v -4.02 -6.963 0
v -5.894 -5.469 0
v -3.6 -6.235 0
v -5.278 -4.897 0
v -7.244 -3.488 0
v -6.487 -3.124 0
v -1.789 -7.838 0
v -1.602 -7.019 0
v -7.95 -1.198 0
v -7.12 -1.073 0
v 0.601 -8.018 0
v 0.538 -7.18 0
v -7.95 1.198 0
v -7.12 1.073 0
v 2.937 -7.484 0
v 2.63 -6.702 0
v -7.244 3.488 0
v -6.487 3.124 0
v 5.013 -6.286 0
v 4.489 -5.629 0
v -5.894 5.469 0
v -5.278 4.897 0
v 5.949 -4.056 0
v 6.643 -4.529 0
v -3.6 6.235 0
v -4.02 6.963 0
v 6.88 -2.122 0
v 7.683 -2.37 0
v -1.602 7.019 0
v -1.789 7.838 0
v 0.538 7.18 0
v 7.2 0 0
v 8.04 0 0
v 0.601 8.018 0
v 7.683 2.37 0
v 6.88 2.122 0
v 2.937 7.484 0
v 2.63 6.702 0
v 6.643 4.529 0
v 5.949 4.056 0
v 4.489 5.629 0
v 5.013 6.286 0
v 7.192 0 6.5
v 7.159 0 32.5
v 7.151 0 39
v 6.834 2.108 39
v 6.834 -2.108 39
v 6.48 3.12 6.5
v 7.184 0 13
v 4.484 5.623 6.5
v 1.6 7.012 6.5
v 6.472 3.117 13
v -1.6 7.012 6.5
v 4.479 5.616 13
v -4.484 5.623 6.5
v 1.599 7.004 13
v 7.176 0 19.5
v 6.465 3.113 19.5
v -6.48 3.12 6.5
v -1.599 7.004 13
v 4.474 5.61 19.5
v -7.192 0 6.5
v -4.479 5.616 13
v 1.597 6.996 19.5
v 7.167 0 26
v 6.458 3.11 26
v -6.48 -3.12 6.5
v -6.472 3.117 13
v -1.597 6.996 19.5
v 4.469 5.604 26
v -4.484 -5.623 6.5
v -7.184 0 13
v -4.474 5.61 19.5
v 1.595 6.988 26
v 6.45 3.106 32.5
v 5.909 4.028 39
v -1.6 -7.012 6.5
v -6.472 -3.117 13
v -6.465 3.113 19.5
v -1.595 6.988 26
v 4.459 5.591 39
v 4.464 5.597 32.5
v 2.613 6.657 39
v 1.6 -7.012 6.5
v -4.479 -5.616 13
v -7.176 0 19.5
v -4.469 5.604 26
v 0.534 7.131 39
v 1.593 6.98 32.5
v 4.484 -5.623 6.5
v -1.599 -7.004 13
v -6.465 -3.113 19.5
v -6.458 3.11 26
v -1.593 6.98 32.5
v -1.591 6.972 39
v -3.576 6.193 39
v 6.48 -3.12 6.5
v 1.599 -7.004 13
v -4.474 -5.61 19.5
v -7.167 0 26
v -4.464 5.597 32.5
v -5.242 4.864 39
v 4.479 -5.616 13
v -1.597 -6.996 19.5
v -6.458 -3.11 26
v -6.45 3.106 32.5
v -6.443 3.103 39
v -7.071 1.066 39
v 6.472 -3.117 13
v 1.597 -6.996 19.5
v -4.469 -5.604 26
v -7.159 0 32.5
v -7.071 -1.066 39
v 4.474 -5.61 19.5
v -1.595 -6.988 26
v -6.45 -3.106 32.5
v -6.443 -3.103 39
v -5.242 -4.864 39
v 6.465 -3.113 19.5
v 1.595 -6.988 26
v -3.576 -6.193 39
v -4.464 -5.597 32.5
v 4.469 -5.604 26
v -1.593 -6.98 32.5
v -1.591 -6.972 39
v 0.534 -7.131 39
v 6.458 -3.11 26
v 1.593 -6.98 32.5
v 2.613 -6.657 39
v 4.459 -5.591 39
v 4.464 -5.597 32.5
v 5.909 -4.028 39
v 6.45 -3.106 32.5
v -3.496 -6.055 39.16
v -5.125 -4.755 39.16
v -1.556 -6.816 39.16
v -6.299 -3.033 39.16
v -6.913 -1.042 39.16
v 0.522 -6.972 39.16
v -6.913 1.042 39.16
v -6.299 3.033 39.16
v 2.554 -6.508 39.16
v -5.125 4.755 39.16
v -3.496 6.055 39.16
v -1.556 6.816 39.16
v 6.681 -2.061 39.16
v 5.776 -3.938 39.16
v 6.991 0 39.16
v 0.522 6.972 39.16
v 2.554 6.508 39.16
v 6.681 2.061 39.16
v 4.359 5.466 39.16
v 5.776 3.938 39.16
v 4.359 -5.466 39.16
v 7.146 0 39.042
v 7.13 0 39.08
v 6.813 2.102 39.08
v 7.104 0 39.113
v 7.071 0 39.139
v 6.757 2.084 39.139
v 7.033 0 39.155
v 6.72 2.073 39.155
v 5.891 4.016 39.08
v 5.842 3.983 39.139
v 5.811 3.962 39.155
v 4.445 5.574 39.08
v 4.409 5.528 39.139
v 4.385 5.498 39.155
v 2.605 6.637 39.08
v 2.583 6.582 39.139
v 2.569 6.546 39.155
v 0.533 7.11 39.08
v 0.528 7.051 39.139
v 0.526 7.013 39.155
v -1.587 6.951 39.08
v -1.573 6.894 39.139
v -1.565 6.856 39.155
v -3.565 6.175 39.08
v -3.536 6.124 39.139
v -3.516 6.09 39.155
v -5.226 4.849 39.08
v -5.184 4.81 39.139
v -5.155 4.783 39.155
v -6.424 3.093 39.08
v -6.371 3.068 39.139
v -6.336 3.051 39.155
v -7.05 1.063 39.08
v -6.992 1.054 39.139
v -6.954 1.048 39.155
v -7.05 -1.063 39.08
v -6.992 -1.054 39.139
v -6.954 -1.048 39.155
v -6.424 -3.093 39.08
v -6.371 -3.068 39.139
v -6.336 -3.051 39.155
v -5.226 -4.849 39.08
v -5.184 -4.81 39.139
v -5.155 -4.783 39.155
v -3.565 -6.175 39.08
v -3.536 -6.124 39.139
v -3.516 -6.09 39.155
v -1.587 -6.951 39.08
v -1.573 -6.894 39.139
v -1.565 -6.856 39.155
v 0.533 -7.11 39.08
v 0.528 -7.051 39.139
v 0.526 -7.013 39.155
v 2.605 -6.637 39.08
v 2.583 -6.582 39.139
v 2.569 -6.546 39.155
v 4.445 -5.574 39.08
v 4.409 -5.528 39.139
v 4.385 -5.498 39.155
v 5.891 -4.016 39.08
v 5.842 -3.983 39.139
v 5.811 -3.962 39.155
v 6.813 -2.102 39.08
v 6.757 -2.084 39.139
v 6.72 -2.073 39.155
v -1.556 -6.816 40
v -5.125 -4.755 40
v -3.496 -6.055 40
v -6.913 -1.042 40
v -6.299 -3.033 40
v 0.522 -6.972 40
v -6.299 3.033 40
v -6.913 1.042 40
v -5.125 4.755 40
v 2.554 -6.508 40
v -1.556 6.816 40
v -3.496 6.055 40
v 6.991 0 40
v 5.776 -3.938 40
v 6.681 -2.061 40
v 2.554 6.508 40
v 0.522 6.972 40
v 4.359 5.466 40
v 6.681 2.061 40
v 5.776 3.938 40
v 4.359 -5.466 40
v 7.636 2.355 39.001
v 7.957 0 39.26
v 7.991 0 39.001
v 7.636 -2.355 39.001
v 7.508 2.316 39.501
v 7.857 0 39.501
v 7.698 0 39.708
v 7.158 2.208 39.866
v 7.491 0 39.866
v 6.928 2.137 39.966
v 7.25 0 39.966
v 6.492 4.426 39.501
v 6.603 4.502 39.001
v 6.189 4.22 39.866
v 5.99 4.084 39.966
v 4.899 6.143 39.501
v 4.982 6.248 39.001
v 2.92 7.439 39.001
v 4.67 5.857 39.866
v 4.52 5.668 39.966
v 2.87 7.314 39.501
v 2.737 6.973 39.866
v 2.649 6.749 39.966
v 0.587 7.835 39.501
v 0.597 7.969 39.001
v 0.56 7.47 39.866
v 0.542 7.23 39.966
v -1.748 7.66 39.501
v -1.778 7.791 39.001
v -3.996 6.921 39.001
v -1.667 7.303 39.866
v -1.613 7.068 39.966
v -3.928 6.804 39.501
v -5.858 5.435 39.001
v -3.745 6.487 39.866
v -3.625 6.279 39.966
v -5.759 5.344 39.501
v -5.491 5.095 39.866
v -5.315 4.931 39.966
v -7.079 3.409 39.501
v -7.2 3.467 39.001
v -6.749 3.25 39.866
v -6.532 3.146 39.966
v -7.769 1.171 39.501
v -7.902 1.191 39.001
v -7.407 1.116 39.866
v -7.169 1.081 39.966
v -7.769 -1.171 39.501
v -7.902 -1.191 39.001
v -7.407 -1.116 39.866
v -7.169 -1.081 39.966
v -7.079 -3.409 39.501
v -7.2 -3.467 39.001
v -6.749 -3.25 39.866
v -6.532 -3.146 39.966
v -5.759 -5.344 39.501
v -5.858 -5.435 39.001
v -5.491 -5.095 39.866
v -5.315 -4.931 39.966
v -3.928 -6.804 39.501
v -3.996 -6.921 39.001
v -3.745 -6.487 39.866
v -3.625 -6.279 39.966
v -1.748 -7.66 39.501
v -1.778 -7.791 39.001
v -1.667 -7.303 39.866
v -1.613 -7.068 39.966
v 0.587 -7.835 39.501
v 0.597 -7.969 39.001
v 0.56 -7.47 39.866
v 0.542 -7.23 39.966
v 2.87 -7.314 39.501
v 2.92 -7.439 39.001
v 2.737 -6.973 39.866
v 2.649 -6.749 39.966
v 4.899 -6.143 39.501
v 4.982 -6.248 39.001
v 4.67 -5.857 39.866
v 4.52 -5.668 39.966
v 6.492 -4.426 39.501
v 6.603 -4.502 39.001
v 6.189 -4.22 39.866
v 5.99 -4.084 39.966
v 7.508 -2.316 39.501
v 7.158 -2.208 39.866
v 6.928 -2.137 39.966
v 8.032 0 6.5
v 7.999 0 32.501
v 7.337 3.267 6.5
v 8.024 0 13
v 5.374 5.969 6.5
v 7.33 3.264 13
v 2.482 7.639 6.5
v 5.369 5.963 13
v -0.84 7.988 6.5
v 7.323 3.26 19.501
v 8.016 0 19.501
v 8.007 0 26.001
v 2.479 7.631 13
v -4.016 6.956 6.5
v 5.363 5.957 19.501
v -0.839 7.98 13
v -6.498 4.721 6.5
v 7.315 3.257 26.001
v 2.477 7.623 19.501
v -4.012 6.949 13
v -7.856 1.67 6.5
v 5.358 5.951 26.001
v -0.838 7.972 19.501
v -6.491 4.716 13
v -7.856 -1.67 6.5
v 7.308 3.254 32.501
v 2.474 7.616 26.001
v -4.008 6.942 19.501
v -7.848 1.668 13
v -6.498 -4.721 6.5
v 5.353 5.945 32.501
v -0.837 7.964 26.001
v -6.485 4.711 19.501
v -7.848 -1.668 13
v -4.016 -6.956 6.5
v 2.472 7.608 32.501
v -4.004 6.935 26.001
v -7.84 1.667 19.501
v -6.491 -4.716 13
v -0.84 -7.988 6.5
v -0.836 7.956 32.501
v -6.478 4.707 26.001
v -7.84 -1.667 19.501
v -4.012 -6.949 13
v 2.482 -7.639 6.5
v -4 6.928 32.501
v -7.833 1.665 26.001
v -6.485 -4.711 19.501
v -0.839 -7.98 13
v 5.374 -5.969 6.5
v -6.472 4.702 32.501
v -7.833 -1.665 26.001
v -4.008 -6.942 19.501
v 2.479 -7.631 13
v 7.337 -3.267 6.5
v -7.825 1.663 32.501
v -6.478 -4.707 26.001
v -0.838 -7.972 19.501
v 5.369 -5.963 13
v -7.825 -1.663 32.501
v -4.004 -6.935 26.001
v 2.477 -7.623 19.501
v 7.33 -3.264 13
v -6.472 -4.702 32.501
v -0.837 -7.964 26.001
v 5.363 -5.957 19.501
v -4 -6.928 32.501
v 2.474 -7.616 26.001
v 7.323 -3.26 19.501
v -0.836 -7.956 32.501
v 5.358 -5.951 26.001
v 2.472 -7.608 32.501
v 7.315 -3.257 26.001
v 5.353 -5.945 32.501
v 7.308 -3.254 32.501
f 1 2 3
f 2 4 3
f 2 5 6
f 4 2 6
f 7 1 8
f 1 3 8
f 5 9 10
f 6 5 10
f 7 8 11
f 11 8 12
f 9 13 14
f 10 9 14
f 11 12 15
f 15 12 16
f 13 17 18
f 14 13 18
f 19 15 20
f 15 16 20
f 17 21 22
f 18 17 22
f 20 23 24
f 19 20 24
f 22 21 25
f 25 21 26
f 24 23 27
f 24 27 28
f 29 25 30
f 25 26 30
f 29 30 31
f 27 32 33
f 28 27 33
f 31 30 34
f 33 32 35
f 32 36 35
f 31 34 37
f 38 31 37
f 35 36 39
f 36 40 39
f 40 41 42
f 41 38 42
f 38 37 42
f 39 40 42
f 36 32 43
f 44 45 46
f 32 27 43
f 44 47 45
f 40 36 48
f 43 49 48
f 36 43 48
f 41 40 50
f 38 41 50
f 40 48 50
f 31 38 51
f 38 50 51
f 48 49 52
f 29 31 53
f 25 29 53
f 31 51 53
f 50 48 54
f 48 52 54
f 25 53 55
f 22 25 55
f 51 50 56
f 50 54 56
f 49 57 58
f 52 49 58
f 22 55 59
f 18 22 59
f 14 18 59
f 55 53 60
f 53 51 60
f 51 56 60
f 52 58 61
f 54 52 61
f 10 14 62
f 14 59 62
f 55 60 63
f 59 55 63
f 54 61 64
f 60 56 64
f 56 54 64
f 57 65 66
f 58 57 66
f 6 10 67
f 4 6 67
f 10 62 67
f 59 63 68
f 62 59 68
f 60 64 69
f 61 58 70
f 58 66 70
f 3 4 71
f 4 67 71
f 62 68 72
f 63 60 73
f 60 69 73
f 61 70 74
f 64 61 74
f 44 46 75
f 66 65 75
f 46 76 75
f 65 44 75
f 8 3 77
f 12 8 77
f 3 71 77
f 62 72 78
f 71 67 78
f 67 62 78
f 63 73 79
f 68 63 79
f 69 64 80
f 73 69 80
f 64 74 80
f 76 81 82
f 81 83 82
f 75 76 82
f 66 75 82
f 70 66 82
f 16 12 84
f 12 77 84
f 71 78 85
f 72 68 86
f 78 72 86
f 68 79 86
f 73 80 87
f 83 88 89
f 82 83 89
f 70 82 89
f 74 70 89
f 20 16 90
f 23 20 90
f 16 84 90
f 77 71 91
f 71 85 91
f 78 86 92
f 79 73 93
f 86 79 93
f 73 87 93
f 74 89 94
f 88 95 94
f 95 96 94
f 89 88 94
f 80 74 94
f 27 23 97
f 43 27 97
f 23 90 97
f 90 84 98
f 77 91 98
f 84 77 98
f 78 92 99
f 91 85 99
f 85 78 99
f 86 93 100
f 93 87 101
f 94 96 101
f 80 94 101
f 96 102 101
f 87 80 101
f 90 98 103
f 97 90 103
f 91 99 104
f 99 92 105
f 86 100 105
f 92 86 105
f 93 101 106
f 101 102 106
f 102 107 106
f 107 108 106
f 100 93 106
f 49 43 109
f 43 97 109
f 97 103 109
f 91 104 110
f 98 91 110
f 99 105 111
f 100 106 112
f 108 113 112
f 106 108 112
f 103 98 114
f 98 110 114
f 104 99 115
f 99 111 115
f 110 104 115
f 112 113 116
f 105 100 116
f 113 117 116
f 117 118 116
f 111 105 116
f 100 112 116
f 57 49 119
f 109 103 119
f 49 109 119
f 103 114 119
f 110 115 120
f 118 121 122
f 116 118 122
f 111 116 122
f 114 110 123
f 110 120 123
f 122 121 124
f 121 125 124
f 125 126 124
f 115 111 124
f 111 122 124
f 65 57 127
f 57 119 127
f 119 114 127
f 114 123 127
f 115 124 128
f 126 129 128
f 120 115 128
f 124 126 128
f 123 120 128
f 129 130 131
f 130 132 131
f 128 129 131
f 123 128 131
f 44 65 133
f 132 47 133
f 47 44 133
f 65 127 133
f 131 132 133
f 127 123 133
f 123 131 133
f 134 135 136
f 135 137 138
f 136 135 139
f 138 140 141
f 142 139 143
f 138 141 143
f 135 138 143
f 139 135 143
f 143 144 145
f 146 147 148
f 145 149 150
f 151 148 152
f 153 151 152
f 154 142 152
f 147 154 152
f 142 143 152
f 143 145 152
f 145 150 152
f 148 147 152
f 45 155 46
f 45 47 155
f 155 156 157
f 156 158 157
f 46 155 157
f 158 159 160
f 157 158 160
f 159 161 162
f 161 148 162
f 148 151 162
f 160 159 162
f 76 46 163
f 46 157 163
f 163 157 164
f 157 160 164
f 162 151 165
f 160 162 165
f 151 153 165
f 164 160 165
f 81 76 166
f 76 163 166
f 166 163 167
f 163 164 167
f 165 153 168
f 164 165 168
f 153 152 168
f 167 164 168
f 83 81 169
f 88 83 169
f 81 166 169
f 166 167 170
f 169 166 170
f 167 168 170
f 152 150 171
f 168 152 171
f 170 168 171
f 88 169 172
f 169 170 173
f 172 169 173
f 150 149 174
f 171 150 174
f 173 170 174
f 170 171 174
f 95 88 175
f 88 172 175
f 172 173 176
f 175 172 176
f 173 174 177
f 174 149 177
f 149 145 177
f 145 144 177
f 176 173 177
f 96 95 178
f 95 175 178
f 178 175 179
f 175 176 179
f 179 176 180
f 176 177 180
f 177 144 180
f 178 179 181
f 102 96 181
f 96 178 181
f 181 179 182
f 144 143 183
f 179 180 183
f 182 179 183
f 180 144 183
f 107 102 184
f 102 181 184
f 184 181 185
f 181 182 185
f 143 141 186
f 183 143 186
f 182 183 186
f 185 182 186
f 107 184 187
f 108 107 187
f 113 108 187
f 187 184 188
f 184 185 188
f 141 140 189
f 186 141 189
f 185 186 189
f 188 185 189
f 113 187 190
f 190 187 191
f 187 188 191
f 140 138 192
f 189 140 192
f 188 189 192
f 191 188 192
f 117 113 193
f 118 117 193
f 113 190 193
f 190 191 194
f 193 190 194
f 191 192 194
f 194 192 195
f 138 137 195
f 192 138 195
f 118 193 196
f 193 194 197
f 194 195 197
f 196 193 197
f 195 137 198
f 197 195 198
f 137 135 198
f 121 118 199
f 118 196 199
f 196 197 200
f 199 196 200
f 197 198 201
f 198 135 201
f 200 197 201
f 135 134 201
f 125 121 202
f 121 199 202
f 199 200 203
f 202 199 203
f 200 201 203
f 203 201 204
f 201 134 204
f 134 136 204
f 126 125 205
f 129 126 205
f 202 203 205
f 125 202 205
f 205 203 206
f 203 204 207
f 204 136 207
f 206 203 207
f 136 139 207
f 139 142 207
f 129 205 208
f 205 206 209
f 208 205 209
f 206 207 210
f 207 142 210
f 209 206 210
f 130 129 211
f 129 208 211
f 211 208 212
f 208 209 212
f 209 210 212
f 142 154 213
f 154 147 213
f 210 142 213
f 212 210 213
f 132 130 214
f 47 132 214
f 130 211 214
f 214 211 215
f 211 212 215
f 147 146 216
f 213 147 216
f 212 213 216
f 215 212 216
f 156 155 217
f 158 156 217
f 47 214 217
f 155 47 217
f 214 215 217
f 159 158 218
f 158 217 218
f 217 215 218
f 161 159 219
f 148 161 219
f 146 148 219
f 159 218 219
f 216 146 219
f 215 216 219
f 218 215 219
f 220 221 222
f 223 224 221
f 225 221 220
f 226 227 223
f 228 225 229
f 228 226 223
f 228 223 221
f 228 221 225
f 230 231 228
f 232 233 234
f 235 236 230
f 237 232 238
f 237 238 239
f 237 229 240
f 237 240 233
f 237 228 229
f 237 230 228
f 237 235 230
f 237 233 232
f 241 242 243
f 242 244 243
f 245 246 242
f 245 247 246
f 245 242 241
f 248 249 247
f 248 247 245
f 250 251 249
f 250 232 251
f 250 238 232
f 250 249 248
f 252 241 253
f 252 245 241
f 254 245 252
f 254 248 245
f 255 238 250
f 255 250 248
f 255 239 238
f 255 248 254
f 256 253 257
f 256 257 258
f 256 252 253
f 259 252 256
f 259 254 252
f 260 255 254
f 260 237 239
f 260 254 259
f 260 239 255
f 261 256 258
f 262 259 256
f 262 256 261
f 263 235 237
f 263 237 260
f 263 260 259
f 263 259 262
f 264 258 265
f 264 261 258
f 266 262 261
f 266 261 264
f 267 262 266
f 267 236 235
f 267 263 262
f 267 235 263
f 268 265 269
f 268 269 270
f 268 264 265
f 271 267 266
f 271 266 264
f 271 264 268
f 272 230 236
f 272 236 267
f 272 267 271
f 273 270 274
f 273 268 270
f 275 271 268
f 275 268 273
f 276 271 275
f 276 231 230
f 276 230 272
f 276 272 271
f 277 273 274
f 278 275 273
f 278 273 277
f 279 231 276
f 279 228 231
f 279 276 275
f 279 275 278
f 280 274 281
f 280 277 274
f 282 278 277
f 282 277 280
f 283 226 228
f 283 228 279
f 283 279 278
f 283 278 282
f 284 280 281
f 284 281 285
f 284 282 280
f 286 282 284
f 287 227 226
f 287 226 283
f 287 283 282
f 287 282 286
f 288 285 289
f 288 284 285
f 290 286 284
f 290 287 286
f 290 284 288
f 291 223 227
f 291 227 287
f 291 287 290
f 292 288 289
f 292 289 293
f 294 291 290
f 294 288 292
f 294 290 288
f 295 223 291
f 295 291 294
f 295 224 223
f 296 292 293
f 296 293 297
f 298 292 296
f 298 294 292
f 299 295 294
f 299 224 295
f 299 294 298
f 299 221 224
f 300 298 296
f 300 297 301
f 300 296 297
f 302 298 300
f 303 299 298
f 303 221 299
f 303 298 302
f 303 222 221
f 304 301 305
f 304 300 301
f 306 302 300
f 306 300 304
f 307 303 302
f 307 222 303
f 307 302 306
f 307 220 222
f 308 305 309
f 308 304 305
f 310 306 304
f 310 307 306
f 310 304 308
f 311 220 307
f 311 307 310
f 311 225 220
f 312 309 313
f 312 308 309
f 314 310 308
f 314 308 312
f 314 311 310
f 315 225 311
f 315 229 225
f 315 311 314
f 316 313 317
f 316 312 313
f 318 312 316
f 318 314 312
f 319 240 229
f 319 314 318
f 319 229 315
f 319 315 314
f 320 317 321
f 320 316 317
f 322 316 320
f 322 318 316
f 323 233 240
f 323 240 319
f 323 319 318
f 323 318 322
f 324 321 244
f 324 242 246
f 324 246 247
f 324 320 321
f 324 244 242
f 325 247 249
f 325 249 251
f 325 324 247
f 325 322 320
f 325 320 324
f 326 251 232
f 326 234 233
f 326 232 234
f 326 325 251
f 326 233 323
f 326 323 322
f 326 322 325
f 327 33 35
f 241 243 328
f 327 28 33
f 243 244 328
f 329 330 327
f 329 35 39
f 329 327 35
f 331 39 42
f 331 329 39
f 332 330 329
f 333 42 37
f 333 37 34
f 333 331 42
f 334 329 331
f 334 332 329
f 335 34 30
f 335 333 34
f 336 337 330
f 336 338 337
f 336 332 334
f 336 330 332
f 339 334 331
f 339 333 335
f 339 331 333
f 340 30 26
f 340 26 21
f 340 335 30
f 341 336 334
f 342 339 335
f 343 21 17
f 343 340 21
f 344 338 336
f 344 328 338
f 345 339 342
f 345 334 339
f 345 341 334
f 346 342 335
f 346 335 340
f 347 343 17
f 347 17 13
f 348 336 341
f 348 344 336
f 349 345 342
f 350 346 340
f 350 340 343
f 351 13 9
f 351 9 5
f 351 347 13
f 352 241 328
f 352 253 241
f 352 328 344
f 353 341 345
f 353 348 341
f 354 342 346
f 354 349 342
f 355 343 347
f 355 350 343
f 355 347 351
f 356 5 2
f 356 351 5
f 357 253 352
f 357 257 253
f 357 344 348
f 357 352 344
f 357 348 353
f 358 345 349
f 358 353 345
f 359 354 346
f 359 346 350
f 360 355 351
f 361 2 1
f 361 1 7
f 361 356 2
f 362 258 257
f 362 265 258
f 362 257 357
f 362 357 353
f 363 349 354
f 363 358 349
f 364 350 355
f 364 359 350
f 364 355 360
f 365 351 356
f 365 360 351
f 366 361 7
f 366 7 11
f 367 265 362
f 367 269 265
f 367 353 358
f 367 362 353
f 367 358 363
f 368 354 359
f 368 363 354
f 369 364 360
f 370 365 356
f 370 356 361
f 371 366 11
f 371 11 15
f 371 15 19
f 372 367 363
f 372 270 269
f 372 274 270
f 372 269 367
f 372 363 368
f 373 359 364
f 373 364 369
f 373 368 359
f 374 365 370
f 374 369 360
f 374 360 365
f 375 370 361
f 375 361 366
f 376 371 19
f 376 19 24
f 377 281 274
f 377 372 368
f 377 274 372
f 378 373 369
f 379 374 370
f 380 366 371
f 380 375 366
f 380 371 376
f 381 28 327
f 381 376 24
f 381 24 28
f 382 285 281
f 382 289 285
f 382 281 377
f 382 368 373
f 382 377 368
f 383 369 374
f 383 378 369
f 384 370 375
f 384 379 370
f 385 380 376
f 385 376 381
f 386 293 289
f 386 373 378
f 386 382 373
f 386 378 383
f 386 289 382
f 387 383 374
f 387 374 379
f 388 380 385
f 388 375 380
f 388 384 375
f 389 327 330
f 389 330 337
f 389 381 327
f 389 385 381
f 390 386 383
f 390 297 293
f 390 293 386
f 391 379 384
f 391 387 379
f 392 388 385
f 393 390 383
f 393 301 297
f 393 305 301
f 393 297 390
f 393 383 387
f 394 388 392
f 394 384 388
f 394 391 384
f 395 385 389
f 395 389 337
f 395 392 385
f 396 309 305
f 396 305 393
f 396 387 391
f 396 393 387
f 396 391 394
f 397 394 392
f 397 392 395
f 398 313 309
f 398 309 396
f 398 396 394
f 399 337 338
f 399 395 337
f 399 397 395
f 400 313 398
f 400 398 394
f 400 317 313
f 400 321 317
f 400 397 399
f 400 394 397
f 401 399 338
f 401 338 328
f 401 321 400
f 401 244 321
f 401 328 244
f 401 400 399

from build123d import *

# Parameters (mm, degrees)
F1_R = 8.04
F3_R = 7.99
F5_R = 1
F6_T = -0.84


with BuildPart() as f4:
    # F1 (on Top) → F4 section 0
    with BuildSketch(Plane.XY):
        Circle(F1_R)
    # F3 (on offset) → F4 section 1
    with BuildSketch(Plane.XY.offset(40)):
        Circle(F3_R)
    loft()

    # F5
    f5_edges = [f4.edges().sort_by_distance(p)[0] for p in [
        (-7.99, 0, 40),
    ]]
    fillet(f5_edges, radius=F5_R)

    # F6
    f6_openings = [f4.faces().sort_by_distance(p)[0] for p in [
        (0, 0, 0),
    ]]
    offset(amount=F6_T, openings=f6_openings, kind=Kind.INTERSECTION)


solid = f4.part
